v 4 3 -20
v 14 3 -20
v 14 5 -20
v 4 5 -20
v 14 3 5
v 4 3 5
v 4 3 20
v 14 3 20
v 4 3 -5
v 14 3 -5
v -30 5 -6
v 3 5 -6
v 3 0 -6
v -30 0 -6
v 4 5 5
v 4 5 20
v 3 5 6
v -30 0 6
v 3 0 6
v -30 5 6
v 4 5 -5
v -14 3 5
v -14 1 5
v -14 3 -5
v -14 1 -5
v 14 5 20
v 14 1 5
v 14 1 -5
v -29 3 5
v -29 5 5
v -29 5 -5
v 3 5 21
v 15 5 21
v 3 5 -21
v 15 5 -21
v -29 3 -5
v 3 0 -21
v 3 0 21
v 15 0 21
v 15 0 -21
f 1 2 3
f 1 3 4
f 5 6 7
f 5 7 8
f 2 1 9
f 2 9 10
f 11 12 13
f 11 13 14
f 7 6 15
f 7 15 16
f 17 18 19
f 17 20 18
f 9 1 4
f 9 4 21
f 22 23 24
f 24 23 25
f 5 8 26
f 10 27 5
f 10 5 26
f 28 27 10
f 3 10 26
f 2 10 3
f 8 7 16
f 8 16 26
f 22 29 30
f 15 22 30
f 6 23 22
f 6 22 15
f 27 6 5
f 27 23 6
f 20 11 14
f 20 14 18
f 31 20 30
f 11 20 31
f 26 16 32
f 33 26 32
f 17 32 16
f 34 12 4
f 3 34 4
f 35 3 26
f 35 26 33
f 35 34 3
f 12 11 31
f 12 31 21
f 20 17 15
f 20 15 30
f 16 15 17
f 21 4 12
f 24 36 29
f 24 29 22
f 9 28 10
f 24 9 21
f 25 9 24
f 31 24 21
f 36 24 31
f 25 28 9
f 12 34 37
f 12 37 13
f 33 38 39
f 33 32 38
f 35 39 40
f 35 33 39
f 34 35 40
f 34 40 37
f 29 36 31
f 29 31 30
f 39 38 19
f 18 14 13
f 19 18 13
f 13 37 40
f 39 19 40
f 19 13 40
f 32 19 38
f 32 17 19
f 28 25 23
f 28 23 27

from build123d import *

# Parameters (mm, degrees)
SKETCH_2_W           = 43
SKETCH_2_H           = 10
SKETCH_2_W_2         = 10
SKETCH_2_H_2         = 15
EXTRUDE_1_DEPTH      = 1
EXTRUDE_2_DEPTH      = 4
EXTRUDE_2_DEPTH_BACK = 1
SKETCH_4_W           = 15
SKETCH_4_H           = 10
SKETCH_4_W_2         = 10
SKETCH_4_H_2         = 15
EXTRUDE_3_DEPTH      = 2


with BuildPart() as part:
    # 草图2 → 凸台-拉伸1 (new body)
    with BuildSketch(Plane(origin=(0, 0, 0), x_dir=(1, 0, 0), z_dir=(0, 1, 0))):
        with Locations((-7.5, 0)):
            Rectangle(SKETCH_2_W, SKETCH_2_H)
        with Locations((9, 12.5)):
            Rectangle(SKETCH_2_W_2, SKETCH_2_H_2)
        with Locations((9, -12.5)):
            Rectangle(SKETCH_2_W_2, SKETCH_2_H_2)
    extrude(amount=EXTRUDE_1_DEPTH)

    # 草图3 → 凸台-拉伸2 (add, two sides)
    with BuildSketch(Plane(origin=(0, 1, 0), x_dir=(1, 0, 0), z_dir=(0, 1, 0))) as extrude_2_sk:
        Polygon((15, -21), (15, 21), (3, 21), (3, 6), (-30, 6), (-30, -6), (3, -6), (3, -21), align=None)
        Polygon((14, -20), (14, 20), (4, 20), (4, 5), (-29, 5), (-29, -5), (4, -5), (4, -20), align=None, mode=Mode.SUBTRACT)
    extrude(amount=EXTRUDE_2_DEPTH)
    extrude(extrude_2_sk.sketch, amount=-EXTRUDE_2_DEPTH_BACK)

    # 草图4 → 凸台-拉伸3 (add)
    with BuildSketch(Plane(origin=(0, 1, 0), x_dir=(1, 0, 0), z_dir=(0, 1, 0))):
        with Locations((-21.5, 0)):
            Rectangle(SKETCH_4_W, SKETCH_4_H)
        with Locations((9, 12.5)):
            Rectangle(SKETCH_4_W_2, SKETCH_4_H_2)
        with Locations((9, -12.5)):
            Rectangle(SKETCH_4_W_2, SKETCH_4_H_2)
    extrude(amount=EXTRUDE_3_DEPTH)


solid = part.part
